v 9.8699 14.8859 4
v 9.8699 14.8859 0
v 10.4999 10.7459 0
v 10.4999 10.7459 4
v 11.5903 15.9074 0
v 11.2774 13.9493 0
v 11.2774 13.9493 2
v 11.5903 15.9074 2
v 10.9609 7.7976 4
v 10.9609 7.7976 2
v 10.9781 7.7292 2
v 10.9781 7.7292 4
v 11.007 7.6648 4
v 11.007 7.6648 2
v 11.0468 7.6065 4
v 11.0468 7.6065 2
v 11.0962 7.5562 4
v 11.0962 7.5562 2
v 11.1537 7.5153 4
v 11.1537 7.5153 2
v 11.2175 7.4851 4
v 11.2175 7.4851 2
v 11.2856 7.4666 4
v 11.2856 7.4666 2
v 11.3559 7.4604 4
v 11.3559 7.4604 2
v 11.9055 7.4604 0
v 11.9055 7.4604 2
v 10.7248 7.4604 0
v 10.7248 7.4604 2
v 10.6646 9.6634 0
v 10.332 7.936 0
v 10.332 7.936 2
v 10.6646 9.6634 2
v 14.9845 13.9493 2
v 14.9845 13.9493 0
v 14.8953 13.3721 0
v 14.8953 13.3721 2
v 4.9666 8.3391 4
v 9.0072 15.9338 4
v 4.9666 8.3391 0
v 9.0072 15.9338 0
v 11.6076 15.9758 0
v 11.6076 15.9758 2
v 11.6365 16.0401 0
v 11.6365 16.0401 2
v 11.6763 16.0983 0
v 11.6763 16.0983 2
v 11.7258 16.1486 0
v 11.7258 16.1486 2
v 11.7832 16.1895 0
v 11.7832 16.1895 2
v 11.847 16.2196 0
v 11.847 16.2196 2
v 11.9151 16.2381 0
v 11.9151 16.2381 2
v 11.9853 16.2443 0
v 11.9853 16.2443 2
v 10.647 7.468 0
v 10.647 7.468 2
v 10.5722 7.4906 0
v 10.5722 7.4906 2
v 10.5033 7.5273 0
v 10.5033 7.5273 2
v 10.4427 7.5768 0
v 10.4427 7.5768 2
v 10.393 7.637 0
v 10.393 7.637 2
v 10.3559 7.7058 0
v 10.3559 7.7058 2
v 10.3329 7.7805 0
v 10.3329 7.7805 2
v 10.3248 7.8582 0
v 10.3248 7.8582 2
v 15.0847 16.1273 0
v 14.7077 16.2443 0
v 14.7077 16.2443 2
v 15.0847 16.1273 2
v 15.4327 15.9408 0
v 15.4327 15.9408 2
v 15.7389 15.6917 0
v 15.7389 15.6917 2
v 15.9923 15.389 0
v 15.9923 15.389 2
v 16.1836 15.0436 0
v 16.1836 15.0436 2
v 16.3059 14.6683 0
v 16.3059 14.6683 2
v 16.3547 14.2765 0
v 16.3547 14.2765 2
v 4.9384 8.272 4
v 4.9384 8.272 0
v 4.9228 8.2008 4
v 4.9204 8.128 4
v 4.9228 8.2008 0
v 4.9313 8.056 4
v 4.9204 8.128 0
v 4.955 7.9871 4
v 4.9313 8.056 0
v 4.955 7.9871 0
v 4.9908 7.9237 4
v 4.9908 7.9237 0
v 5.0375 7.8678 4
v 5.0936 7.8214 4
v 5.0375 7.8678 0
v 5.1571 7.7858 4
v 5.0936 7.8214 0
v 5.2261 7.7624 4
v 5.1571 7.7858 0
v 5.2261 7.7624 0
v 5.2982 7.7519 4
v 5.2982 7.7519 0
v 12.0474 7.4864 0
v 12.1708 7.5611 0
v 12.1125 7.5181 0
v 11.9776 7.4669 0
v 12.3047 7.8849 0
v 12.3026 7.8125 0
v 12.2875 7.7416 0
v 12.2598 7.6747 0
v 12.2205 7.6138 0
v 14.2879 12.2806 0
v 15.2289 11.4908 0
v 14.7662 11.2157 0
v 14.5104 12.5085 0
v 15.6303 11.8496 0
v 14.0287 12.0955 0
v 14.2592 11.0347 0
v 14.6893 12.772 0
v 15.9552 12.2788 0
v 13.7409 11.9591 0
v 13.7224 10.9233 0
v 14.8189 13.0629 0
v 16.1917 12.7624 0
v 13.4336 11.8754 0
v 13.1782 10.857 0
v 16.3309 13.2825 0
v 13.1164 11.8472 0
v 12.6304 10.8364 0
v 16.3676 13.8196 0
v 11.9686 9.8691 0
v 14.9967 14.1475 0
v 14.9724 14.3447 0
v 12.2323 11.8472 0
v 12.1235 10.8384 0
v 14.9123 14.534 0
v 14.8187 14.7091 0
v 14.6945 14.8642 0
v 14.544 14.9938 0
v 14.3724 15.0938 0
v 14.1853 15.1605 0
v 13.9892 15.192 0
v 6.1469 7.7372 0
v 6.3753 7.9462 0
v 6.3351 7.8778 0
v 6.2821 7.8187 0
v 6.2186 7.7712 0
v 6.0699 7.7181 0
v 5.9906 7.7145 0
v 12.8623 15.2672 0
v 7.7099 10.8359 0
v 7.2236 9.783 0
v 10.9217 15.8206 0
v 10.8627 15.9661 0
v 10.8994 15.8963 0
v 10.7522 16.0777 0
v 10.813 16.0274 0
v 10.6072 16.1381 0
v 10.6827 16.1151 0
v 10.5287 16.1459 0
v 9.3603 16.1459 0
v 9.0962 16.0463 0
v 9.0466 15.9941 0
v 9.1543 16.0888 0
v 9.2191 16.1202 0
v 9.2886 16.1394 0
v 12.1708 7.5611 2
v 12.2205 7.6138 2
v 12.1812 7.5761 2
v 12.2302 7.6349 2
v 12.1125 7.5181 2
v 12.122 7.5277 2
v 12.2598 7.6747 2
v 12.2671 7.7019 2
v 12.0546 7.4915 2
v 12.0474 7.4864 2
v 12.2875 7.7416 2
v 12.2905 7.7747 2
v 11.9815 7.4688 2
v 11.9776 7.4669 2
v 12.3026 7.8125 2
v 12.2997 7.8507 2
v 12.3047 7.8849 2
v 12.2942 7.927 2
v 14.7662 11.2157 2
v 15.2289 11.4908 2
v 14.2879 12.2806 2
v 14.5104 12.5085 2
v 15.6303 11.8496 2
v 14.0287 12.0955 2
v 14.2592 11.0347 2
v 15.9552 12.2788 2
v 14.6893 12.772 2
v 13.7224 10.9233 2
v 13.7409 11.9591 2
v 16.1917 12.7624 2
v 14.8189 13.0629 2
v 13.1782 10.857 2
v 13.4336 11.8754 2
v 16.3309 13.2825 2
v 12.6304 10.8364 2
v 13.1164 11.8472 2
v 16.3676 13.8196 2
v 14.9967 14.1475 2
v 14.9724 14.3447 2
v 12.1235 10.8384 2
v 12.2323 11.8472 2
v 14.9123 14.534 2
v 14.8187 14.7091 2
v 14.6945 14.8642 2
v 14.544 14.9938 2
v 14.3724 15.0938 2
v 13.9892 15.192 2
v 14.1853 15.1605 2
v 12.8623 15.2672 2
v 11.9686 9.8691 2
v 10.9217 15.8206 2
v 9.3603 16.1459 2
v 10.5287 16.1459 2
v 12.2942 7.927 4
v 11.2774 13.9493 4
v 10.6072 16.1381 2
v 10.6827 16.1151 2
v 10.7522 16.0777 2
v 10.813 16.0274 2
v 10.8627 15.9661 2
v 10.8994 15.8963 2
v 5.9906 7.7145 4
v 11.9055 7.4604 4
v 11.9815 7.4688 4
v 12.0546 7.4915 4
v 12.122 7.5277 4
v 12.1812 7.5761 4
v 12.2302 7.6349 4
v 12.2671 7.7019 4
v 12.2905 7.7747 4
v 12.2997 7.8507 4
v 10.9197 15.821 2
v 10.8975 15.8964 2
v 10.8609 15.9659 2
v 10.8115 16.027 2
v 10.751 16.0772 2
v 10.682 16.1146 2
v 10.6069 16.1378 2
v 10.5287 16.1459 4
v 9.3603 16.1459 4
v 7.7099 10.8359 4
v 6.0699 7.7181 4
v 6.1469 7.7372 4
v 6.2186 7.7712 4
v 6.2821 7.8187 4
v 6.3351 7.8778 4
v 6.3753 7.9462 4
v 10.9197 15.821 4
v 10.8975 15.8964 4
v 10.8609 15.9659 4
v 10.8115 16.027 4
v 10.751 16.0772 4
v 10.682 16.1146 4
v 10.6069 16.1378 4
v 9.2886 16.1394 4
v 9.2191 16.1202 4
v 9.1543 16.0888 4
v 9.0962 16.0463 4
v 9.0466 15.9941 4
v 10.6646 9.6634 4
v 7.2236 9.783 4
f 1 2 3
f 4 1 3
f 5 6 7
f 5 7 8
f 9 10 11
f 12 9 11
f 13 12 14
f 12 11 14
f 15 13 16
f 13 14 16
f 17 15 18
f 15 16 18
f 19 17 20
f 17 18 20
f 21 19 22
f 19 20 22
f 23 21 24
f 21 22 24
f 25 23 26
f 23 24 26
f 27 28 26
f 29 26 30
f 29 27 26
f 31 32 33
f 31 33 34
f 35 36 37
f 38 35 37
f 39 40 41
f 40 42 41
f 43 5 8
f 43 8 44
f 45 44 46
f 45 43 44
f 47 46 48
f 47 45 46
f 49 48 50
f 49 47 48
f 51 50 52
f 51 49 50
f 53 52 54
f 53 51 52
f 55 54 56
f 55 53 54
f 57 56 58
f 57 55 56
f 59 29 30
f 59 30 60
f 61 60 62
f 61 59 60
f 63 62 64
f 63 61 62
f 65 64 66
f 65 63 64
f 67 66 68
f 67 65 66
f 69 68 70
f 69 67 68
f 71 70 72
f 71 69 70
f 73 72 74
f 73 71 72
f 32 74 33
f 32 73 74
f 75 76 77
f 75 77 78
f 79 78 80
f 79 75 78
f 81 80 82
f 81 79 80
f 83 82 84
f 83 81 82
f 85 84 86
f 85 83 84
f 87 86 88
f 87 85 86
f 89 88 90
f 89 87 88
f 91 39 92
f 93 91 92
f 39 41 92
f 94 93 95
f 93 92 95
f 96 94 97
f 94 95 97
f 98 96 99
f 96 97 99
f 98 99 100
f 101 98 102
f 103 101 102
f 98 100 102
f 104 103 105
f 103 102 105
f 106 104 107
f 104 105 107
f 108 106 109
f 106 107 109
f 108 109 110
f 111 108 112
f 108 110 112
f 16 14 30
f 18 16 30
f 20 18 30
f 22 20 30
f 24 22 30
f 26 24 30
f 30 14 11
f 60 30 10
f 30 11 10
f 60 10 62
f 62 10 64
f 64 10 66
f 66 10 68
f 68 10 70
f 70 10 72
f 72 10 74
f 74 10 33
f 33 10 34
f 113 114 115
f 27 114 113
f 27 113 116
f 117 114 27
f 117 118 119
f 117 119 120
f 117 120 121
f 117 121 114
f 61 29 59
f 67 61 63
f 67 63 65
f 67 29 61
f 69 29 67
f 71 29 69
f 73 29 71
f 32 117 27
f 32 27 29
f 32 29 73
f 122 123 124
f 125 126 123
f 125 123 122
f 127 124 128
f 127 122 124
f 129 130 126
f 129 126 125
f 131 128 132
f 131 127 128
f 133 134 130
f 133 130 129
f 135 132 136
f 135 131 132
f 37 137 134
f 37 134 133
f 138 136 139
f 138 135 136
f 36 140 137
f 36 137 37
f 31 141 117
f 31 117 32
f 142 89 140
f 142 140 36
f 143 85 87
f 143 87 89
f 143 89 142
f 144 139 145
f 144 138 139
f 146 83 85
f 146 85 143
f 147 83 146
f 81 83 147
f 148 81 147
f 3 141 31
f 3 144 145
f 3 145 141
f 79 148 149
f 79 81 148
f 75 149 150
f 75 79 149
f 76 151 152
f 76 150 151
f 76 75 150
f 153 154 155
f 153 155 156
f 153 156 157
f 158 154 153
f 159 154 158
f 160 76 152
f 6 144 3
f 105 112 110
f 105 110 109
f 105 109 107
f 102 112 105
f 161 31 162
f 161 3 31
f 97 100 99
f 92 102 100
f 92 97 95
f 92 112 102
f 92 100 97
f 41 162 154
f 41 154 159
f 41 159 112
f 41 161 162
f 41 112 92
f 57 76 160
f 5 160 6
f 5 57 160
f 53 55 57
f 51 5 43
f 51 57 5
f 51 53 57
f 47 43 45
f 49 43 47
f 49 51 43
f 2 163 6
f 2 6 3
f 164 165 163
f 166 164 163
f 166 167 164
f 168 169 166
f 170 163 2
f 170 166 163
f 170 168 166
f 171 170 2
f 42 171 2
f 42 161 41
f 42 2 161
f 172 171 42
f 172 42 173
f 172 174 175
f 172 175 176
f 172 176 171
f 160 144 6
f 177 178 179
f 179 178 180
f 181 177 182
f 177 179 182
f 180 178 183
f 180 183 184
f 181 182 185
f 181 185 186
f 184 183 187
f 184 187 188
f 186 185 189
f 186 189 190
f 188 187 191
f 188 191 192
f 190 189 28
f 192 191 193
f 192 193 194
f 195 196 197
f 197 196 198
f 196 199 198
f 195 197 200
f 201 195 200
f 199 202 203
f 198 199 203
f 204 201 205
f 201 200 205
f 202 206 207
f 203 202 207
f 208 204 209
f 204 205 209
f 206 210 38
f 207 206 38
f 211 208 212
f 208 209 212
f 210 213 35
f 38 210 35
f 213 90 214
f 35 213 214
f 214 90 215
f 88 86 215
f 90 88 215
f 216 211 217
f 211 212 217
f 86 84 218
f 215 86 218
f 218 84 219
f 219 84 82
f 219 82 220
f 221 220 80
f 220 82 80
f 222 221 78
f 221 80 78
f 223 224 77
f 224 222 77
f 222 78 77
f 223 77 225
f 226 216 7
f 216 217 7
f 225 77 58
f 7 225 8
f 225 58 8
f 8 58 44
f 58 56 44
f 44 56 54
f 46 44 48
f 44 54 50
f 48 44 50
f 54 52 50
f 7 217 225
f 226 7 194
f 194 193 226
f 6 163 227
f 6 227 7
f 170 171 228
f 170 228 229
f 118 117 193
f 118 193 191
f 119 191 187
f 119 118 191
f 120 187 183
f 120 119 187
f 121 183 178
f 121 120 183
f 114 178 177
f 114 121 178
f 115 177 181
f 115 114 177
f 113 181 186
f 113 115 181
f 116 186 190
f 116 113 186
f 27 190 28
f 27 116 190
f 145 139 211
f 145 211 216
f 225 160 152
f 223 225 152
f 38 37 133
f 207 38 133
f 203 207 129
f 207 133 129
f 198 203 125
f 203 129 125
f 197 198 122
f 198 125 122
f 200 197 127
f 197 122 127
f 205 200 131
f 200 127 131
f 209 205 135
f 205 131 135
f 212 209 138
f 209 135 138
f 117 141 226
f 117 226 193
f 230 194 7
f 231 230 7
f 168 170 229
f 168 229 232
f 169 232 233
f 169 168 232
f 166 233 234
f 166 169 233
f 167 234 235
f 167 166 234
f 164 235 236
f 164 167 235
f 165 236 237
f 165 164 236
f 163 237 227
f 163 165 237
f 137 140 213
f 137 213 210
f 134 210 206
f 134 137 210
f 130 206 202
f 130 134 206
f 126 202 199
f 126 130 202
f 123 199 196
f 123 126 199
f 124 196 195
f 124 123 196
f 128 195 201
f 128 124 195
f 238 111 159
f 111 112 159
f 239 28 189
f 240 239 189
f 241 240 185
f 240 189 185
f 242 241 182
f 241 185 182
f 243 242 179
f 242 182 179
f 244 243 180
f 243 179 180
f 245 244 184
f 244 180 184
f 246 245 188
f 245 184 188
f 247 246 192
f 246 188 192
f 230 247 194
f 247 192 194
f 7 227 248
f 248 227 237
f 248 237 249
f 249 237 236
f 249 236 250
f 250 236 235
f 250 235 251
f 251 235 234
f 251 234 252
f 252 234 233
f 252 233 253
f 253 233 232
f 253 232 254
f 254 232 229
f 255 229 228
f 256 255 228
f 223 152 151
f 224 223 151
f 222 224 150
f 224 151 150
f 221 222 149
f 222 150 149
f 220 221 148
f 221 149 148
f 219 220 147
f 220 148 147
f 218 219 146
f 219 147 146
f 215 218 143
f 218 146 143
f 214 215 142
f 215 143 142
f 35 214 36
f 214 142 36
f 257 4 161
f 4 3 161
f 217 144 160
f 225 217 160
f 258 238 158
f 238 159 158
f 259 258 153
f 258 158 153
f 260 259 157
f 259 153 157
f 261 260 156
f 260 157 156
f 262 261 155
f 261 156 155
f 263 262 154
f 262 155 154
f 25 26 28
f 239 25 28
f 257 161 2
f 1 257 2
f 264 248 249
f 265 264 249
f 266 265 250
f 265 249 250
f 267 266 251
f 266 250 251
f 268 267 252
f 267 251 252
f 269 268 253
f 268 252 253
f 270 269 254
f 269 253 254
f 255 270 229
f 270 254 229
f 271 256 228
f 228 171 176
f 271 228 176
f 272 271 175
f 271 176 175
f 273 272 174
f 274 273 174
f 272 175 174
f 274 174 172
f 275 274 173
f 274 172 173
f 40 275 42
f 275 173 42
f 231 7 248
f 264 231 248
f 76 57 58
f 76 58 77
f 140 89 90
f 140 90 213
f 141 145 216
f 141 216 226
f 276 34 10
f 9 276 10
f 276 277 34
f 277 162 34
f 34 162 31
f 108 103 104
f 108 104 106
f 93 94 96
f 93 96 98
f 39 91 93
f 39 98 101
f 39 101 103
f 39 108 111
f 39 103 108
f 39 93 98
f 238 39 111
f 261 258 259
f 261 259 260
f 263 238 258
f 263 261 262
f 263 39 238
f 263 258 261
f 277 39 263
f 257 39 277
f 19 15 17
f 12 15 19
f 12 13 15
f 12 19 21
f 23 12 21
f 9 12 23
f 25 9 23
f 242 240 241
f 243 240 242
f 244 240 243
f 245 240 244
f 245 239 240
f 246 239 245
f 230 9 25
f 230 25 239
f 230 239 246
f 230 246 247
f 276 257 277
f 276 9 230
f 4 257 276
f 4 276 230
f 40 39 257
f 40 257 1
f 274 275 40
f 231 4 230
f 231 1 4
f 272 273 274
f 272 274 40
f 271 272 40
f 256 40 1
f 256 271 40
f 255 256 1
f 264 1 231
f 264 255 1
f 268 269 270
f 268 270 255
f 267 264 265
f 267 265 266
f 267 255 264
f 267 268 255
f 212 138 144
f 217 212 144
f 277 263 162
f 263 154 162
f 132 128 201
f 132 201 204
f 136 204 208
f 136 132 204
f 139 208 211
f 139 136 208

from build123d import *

# Parameters (mm, degrees)
BOSS_EXTRUDE1_DEPTH = 2
BOSS_EXTRUDE3_DEPTH = 2


# Read off the part's stored shape, not the designer's step: Boss-Extrude3
with BuildPart() as part:
    # Sketch1 → Boss-Extrude1 (new body)
    with BuildSketch(Plane.XY):
        with BuildLine():
            Line((10.921700045, 15.820627971), (11.277420096, 13.949291525))
            Line((11.277420096, 13.949291525), (11.590342055, 15.907424067))
            ThreePointArc((11.590342055, 15.907424067), (11.725761981, 16.148644901), (11.985330235, 16.244302459))
            Line((11.985330235, 16.244302459), (14.707676179, 16.244302459))
            ThreePointArc((14.707676179, 16.244302459), (15.872864002, 15.546401169), (16.35465827, 14.27651804))
            Line((16.35465827, 14.27651804), (16.367622155, 13.819582081))
            ThreePointArc((16.367622155, 13.819582081), (15.803130226, 12.056353518), (14.259159222, 11.034698173))
            ThreePointArc((14.259159222, 11.034698173), (13.45100908, 10.884495001), (12.630428485, 10.836379176))
            Line((12.630428485, 10.836379176), (12.123518451, 10.838420989))
            Line((12.123518451, 10.838420989), (11.968610095, 9.869070376))
            Line((11.968610095, 9.869070376), (12.30473343, 7.884872777))
            ThreePointArc((12.30473343, 7.884872777), (12.19685885, 7.586331563), (11.905484198, 7.460376837))
            Line((11.905484198, 7.460376837), (10.999839261, 7.460376837))
            Line((10.999839261, 7.460376837), (10.724808345, 7.460376837))
            ThreePointArc((10.724808345, 7.460376837), (10.4163856, 7.605670319), (10.332021927, 7.935999785))
            Line((10.332021927, 7.935999785), (10.664596921, 9.663397929))
            Line((10.664596921, 9.663397929), (7.22360923, 9.783007686))
            Line((7.22360923, 9.783007686), (6.375331355, 7.946169859))
            ThreePointArc((6.375331355, 7.946169859), (6.218562023, 7.771225984), (5.990616105, 7.714457672))
            Line((5.990616105, 7.714457672), (5.298180624, 7.751850988))
            ThreePointArc((5.298180624, 7.751850988), (4.97142736, 7.954619126), (4.966617202, 8.339144126))
            Line((4.966617202, 8.339144126), (9.007156407, 15.933805165))
            ThreePointArc((9.007156407, 15.933805165), (9.1543162, 16.08882219), (9.36028944, 16.145930044))
            Line((9.36028944, 16.145930044), (10.528736663, 16.145930044))
            ThreePointArc((10.528736663, 16.145930044), (10.783806094, 16.054052723), (10.921700045, 15.820627971))
        make_face()
        with BuildLine():
            Line((12.232297108, 11.847227843), (12.862297108, 15.267227843))
            Line((12.862297108, 15.267227843), (13.989185775, 15.191954828))
            ThreePointArc((13.989185775, 15.191954828), (14.760146227, 14.789523159), (14.98451661, 13.949291525))
            Line((14.98451661, 13.949291525), (14.895254355, 13.372120047))
            ThreePointArc((14.895254355, 13.372120047), (14.287898045, 12.28062731), (13.116402, 11.847227843))
            Line((13.116402, 11.847227843), (12.232297108, 11.847227843))
        make_face(mode=Mode.SUBTRACT)
        Polygon((9.869863773, 14.885930044), (10.499863773, 10.745930044), (7.709863773, 10.835930044), align=None, mode=Mode.SUBTRACT)
    extrude(amount=BOSS_EXTRUDE1_DEPTH)

    # Boss-Extrude3 outline → Boss-Extrude3 (add)
    with BuildSketch(Plane.XY.offset(2)):
        with BuildLine():
            Line((10.528736641, 16.145925468), (9.36028944, 16.145930044))
            ThreePointArc((9.36028944, 16.145930044), (9.1543162, 16.08882219), (9.007156407, 15.933805165))
            Line((9.007156407, 15.933805165), (4.966617202, 8.339144126))
            ThreePointArc((4.966617202, 8.339144126), (4.97142736, 7.954619126), (5.298180624, 7.751850988))
            Line((5.298180624, 7.751850988), (5.990616105, 7.714457672))
            ThreePointArc((5.990616105, 7.714457672), (6.218562023, 7.771225984), (6.375331355, 7.946169859))
            Line((6.375331355, 7.946169859), (7.22360923, 9.783007686))
            Line((7.22360923, 9.783007686), (10.664596921, 9.663397929))
            Line((10.664596921, 9.663397929), (10.960889342, 7.797640802))
            ThreePointArc((10.960889342, 7.797640802), (11.096222191, 7.556161112), (11.355938946, 7.460376837))
            Line((11.355938946, 7.460376837), (11.905483631, 7.460416896))
            ThreePointArc((11.905483631, 7.460416896), (12.207123715, 7.604318029), (12.294240301, 7.926971058))
            Line((12.294240301, 7.926971058), (11.277420096, 13.949291525))
            Line((11.277420096, 13.949291525), (10.919712975, 15.821015565))
            ThreePointArc((10.919712975, 15.821015565), (10.782477337, 16.05356798), (10.528736641, 16.145925468))
        make_face()
        Polygon((10.499863773, 10.745930044), (7.709863773, 10.835930044), (9.869863773, 14.885930044), align=None, mode=Mode.SUBTRACT)
    extrude(amount=BOSS_EXTRUDE3_DEPTH)


solid = part.part
